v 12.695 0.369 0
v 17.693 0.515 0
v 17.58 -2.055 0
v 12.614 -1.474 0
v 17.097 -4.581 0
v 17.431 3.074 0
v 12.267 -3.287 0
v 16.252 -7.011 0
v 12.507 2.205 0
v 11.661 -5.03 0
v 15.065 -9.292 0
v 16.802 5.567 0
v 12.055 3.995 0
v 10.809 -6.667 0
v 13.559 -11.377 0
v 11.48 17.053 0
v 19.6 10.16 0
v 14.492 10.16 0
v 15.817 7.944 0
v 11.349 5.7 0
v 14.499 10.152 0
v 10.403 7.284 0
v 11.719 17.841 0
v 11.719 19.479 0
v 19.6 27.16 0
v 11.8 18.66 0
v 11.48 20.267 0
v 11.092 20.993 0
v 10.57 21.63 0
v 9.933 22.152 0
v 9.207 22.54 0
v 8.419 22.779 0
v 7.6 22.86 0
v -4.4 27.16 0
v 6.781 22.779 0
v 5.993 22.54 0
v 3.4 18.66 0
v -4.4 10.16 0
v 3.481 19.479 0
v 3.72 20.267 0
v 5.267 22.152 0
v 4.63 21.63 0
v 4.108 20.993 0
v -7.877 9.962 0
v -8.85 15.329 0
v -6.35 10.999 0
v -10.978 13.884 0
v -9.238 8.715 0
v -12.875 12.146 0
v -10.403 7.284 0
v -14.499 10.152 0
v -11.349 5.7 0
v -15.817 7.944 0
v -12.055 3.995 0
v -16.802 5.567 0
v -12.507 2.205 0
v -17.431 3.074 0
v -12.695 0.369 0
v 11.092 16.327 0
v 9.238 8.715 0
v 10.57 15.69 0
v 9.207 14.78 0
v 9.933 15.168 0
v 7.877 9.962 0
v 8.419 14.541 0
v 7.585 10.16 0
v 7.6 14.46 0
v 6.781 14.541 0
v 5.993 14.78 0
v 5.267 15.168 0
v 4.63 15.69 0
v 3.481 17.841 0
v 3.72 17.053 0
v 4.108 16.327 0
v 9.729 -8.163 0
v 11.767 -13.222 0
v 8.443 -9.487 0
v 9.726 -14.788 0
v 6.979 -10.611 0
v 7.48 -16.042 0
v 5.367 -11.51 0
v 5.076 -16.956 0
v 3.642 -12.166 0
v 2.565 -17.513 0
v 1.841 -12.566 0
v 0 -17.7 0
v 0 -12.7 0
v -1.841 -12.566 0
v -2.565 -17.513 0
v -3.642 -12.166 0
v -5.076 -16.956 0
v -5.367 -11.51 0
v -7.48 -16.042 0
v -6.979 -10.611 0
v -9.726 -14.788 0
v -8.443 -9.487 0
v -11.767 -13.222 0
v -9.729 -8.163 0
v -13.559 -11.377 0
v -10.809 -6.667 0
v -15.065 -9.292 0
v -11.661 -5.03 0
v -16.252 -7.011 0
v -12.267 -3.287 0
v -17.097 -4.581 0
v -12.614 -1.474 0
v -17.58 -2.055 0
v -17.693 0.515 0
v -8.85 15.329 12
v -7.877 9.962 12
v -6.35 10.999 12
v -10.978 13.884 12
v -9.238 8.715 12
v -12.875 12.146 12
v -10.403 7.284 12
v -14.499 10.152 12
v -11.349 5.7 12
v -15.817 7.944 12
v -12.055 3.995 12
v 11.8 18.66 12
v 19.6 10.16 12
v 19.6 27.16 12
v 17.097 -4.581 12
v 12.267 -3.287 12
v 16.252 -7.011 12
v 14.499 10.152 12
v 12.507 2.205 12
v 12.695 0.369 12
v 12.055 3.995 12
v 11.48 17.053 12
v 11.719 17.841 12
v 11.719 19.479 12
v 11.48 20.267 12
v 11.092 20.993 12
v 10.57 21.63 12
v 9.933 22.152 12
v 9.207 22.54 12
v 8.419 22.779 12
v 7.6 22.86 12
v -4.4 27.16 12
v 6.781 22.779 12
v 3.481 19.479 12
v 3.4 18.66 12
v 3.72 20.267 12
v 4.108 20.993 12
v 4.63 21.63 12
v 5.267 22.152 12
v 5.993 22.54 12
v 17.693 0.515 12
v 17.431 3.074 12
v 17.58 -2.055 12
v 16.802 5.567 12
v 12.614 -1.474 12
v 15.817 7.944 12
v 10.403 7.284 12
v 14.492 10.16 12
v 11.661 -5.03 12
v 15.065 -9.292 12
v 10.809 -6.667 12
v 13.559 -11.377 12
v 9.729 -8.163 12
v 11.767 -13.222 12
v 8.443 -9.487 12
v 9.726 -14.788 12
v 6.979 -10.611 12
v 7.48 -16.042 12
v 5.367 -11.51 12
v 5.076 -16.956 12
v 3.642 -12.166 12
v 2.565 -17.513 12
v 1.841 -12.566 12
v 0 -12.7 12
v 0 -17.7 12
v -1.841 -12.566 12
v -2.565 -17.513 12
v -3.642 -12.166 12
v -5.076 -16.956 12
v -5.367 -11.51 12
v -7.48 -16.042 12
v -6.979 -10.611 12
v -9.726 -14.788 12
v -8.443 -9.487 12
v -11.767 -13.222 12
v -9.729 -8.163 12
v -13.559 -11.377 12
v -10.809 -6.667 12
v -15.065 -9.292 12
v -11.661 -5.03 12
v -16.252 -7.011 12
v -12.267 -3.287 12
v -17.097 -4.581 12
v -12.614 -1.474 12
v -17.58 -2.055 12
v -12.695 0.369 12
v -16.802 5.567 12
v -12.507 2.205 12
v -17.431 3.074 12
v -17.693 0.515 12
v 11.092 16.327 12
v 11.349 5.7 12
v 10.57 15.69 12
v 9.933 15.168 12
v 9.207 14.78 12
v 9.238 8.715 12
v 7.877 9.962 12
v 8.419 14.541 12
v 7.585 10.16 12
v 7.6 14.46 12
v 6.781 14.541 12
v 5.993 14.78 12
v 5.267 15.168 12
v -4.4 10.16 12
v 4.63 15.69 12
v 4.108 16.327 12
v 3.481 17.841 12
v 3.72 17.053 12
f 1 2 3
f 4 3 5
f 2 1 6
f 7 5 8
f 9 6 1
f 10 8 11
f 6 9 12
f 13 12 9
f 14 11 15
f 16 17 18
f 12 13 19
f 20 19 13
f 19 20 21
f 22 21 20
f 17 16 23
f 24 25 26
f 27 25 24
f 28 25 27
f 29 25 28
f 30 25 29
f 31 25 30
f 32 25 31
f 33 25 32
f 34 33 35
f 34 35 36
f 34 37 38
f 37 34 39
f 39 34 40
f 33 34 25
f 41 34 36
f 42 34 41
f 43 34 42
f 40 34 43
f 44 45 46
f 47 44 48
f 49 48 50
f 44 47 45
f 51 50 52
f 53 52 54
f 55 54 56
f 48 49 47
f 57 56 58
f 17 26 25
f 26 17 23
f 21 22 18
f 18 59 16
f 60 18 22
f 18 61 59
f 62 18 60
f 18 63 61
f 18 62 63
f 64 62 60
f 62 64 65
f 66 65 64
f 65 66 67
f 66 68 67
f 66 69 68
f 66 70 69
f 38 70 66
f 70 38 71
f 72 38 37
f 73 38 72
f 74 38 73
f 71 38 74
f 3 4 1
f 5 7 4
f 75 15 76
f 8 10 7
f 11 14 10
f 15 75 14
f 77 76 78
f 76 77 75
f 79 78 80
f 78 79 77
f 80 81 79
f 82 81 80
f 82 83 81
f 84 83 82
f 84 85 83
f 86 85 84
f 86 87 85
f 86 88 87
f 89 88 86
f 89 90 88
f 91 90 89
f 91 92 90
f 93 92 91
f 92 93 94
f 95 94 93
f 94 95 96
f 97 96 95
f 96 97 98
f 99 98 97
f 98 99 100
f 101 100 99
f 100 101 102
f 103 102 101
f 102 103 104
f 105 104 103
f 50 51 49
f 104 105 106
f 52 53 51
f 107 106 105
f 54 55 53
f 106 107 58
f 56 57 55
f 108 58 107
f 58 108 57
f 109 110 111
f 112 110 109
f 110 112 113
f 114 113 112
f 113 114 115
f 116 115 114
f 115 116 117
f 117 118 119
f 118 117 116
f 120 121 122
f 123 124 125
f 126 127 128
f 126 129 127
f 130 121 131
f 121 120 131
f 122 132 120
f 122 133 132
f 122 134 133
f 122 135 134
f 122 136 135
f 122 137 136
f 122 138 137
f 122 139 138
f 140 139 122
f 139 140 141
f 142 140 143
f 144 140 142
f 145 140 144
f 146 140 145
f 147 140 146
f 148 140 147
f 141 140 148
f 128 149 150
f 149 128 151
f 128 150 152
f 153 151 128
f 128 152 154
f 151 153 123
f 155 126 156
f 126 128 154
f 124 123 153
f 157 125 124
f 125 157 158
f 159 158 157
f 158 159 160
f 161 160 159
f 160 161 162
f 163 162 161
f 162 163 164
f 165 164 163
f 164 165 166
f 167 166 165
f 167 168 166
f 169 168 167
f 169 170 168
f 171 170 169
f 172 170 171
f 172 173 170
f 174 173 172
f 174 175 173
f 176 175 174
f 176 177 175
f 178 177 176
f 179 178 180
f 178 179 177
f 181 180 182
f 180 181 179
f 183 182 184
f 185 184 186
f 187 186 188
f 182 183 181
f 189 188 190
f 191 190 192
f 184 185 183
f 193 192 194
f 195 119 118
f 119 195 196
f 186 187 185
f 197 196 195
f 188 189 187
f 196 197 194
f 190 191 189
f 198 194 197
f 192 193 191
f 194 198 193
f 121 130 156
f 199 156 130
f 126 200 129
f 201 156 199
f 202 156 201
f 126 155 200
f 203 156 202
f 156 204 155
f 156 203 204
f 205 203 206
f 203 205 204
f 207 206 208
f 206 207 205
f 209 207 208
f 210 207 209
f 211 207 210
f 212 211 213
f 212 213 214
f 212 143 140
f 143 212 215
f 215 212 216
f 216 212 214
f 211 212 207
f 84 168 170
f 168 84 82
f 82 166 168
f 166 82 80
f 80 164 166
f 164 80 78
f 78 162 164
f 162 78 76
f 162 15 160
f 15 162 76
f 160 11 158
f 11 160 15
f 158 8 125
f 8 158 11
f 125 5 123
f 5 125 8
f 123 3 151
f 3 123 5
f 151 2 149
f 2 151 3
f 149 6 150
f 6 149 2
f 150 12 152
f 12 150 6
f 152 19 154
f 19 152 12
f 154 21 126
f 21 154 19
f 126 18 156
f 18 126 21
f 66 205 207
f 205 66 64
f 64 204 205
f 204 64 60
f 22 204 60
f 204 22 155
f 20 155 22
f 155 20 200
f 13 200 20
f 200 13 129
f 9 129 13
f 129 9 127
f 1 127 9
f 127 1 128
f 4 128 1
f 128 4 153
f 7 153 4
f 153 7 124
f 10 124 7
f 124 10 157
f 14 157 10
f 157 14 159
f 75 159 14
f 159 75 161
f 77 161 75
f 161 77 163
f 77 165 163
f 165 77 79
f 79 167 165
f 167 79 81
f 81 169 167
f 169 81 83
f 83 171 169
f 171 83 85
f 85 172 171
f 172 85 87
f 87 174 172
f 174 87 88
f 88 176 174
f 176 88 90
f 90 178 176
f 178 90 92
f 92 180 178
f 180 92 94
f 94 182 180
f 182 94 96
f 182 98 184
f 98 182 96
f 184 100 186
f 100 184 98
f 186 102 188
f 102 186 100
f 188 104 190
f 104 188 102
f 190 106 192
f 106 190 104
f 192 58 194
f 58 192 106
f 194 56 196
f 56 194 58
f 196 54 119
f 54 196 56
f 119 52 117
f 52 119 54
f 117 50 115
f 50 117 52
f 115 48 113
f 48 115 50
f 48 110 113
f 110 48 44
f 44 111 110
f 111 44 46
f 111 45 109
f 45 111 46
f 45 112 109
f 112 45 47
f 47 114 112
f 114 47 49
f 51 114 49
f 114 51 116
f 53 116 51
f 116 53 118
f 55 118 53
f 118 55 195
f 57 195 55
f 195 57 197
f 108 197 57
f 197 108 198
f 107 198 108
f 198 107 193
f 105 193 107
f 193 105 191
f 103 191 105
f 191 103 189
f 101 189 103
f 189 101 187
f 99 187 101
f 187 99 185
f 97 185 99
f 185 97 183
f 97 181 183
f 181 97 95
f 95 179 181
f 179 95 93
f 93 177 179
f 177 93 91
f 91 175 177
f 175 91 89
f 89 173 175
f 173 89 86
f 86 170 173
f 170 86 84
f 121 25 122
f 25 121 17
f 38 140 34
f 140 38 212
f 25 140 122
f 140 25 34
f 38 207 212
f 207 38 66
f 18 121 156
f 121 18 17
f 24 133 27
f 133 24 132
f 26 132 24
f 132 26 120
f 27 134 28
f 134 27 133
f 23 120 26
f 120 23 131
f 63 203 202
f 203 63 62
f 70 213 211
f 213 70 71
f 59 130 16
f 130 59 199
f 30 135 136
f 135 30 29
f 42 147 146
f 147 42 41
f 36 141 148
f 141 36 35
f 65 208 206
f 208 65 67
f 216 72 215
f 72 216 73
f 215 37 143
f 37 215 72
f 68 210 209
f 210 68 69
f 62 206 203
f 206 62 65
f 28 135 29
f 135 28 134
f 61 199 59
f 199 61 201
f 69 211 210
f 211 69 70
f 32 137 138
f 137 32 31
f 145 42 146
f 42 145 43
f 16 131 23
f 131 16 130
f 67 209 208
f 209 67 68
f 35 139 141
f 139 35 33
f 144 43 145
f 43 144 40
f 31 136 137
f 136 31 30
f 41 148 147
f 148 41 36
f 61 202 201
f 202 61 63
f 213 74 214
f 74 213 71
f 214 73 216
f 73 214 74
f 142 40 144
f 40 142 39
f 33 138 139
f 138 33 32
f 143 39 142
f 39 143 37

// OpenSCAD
$fn = 32;

// ----------------------------------------------------------------------
// Pipe clamp: 35.4 mm ring, 5 mm wall, 12 mm wide
// ----------------------------------------------------------------------

// --- parameters (mm) ---
outer_r = 17.7;           // clamp outside radius
inner_r = 12.7;           // pipe bore radius
band = 5;                 // band thickness
clamp_w = 12;             // clamp width
opening = 60;             // opening angle between the ends
lug_w = 24;               // lug width
lug_len = 17;             // lug length
bolt_d = 8.4;             // bolt hole

clamp_profile = [[-8.85, 15.329], [-10.978, 13.884], [-12.875, 12.146], [-14.499, 10.152], [-15.817, 7.944], [-16.802, 5.567], [-17.431, 3.074], [-17.693, 0.515], [-17.58, -2.055], [-17.097, -4.581], [-16.252, -7.011], [-15.065, -9.292], [-13.559, -11.377], [-11.767, -13.222], [-9.726, -14.788], [-7.48, -16.042], [-5.076, -16.956], [-2.565, -17.513], [0, -17.7], [2.565, -17.513], [5.076, -16.956], [7.48, -16.042], [9.726, -14.788], [11.767, -13.222], [13.559, -11.377], [15.065, -9.292], [16.252, -7.011], [17.097, -4.581], [17.58, -2.055], [17.693, 0.515], [17.431, 3.074], [16.802, 5.567], [15.817, 7.944], [14.499, 10.152], [12.875, 12.146], [10.978, 13.884], [8.85, 15.329], [6.35, 10.999], [7.877, 9.962], [9.238, 8.715], [10.403, 7.284], [11.349, 5.7], [12.055, 3.995], [12.507, 2.205], [12.695, 0.369], [12.614, -1.474], [12.267, -3.287], [11.661, -5.03], [10.809, -6.667], [9.729, -8.163], [8.443, -9.487], [6.979, -10.611], [5.367, -11.51], [3.642, -12.166], [1.841, -12.566], [0, -12.7], [-1.841, -12.566], [-3.642, -12.166], [-5.367, -11.51], [-6.979, -10.611], [-8.443, -9.487], [-9.729, -8.163], [-10.809, -6.667], [-11.661, -5.03], [-12.267, -3.287], [-12.614, -1.474], [-12.695, 0.369], [-12.507, 2.205], [-12.055, 3.995], [-11.349, 5.7], [-10.403, 7.284], [-9.238, 8.715], [-7.877, 9.962], [-6.35, 10.999]];

difference() {
  union() {
    linear_extrude(height = clamp_w) polygon(clamp_profile);
    /* bolt lug on the other end */
    translate([-4.4, 10.16, 0]) cube([lug_w, 17, clamp_w]);
  }
  translate([7.6, 18.66, -2.5]) cylinder(h = clamp_w + 5, d = bolt_d);
}
